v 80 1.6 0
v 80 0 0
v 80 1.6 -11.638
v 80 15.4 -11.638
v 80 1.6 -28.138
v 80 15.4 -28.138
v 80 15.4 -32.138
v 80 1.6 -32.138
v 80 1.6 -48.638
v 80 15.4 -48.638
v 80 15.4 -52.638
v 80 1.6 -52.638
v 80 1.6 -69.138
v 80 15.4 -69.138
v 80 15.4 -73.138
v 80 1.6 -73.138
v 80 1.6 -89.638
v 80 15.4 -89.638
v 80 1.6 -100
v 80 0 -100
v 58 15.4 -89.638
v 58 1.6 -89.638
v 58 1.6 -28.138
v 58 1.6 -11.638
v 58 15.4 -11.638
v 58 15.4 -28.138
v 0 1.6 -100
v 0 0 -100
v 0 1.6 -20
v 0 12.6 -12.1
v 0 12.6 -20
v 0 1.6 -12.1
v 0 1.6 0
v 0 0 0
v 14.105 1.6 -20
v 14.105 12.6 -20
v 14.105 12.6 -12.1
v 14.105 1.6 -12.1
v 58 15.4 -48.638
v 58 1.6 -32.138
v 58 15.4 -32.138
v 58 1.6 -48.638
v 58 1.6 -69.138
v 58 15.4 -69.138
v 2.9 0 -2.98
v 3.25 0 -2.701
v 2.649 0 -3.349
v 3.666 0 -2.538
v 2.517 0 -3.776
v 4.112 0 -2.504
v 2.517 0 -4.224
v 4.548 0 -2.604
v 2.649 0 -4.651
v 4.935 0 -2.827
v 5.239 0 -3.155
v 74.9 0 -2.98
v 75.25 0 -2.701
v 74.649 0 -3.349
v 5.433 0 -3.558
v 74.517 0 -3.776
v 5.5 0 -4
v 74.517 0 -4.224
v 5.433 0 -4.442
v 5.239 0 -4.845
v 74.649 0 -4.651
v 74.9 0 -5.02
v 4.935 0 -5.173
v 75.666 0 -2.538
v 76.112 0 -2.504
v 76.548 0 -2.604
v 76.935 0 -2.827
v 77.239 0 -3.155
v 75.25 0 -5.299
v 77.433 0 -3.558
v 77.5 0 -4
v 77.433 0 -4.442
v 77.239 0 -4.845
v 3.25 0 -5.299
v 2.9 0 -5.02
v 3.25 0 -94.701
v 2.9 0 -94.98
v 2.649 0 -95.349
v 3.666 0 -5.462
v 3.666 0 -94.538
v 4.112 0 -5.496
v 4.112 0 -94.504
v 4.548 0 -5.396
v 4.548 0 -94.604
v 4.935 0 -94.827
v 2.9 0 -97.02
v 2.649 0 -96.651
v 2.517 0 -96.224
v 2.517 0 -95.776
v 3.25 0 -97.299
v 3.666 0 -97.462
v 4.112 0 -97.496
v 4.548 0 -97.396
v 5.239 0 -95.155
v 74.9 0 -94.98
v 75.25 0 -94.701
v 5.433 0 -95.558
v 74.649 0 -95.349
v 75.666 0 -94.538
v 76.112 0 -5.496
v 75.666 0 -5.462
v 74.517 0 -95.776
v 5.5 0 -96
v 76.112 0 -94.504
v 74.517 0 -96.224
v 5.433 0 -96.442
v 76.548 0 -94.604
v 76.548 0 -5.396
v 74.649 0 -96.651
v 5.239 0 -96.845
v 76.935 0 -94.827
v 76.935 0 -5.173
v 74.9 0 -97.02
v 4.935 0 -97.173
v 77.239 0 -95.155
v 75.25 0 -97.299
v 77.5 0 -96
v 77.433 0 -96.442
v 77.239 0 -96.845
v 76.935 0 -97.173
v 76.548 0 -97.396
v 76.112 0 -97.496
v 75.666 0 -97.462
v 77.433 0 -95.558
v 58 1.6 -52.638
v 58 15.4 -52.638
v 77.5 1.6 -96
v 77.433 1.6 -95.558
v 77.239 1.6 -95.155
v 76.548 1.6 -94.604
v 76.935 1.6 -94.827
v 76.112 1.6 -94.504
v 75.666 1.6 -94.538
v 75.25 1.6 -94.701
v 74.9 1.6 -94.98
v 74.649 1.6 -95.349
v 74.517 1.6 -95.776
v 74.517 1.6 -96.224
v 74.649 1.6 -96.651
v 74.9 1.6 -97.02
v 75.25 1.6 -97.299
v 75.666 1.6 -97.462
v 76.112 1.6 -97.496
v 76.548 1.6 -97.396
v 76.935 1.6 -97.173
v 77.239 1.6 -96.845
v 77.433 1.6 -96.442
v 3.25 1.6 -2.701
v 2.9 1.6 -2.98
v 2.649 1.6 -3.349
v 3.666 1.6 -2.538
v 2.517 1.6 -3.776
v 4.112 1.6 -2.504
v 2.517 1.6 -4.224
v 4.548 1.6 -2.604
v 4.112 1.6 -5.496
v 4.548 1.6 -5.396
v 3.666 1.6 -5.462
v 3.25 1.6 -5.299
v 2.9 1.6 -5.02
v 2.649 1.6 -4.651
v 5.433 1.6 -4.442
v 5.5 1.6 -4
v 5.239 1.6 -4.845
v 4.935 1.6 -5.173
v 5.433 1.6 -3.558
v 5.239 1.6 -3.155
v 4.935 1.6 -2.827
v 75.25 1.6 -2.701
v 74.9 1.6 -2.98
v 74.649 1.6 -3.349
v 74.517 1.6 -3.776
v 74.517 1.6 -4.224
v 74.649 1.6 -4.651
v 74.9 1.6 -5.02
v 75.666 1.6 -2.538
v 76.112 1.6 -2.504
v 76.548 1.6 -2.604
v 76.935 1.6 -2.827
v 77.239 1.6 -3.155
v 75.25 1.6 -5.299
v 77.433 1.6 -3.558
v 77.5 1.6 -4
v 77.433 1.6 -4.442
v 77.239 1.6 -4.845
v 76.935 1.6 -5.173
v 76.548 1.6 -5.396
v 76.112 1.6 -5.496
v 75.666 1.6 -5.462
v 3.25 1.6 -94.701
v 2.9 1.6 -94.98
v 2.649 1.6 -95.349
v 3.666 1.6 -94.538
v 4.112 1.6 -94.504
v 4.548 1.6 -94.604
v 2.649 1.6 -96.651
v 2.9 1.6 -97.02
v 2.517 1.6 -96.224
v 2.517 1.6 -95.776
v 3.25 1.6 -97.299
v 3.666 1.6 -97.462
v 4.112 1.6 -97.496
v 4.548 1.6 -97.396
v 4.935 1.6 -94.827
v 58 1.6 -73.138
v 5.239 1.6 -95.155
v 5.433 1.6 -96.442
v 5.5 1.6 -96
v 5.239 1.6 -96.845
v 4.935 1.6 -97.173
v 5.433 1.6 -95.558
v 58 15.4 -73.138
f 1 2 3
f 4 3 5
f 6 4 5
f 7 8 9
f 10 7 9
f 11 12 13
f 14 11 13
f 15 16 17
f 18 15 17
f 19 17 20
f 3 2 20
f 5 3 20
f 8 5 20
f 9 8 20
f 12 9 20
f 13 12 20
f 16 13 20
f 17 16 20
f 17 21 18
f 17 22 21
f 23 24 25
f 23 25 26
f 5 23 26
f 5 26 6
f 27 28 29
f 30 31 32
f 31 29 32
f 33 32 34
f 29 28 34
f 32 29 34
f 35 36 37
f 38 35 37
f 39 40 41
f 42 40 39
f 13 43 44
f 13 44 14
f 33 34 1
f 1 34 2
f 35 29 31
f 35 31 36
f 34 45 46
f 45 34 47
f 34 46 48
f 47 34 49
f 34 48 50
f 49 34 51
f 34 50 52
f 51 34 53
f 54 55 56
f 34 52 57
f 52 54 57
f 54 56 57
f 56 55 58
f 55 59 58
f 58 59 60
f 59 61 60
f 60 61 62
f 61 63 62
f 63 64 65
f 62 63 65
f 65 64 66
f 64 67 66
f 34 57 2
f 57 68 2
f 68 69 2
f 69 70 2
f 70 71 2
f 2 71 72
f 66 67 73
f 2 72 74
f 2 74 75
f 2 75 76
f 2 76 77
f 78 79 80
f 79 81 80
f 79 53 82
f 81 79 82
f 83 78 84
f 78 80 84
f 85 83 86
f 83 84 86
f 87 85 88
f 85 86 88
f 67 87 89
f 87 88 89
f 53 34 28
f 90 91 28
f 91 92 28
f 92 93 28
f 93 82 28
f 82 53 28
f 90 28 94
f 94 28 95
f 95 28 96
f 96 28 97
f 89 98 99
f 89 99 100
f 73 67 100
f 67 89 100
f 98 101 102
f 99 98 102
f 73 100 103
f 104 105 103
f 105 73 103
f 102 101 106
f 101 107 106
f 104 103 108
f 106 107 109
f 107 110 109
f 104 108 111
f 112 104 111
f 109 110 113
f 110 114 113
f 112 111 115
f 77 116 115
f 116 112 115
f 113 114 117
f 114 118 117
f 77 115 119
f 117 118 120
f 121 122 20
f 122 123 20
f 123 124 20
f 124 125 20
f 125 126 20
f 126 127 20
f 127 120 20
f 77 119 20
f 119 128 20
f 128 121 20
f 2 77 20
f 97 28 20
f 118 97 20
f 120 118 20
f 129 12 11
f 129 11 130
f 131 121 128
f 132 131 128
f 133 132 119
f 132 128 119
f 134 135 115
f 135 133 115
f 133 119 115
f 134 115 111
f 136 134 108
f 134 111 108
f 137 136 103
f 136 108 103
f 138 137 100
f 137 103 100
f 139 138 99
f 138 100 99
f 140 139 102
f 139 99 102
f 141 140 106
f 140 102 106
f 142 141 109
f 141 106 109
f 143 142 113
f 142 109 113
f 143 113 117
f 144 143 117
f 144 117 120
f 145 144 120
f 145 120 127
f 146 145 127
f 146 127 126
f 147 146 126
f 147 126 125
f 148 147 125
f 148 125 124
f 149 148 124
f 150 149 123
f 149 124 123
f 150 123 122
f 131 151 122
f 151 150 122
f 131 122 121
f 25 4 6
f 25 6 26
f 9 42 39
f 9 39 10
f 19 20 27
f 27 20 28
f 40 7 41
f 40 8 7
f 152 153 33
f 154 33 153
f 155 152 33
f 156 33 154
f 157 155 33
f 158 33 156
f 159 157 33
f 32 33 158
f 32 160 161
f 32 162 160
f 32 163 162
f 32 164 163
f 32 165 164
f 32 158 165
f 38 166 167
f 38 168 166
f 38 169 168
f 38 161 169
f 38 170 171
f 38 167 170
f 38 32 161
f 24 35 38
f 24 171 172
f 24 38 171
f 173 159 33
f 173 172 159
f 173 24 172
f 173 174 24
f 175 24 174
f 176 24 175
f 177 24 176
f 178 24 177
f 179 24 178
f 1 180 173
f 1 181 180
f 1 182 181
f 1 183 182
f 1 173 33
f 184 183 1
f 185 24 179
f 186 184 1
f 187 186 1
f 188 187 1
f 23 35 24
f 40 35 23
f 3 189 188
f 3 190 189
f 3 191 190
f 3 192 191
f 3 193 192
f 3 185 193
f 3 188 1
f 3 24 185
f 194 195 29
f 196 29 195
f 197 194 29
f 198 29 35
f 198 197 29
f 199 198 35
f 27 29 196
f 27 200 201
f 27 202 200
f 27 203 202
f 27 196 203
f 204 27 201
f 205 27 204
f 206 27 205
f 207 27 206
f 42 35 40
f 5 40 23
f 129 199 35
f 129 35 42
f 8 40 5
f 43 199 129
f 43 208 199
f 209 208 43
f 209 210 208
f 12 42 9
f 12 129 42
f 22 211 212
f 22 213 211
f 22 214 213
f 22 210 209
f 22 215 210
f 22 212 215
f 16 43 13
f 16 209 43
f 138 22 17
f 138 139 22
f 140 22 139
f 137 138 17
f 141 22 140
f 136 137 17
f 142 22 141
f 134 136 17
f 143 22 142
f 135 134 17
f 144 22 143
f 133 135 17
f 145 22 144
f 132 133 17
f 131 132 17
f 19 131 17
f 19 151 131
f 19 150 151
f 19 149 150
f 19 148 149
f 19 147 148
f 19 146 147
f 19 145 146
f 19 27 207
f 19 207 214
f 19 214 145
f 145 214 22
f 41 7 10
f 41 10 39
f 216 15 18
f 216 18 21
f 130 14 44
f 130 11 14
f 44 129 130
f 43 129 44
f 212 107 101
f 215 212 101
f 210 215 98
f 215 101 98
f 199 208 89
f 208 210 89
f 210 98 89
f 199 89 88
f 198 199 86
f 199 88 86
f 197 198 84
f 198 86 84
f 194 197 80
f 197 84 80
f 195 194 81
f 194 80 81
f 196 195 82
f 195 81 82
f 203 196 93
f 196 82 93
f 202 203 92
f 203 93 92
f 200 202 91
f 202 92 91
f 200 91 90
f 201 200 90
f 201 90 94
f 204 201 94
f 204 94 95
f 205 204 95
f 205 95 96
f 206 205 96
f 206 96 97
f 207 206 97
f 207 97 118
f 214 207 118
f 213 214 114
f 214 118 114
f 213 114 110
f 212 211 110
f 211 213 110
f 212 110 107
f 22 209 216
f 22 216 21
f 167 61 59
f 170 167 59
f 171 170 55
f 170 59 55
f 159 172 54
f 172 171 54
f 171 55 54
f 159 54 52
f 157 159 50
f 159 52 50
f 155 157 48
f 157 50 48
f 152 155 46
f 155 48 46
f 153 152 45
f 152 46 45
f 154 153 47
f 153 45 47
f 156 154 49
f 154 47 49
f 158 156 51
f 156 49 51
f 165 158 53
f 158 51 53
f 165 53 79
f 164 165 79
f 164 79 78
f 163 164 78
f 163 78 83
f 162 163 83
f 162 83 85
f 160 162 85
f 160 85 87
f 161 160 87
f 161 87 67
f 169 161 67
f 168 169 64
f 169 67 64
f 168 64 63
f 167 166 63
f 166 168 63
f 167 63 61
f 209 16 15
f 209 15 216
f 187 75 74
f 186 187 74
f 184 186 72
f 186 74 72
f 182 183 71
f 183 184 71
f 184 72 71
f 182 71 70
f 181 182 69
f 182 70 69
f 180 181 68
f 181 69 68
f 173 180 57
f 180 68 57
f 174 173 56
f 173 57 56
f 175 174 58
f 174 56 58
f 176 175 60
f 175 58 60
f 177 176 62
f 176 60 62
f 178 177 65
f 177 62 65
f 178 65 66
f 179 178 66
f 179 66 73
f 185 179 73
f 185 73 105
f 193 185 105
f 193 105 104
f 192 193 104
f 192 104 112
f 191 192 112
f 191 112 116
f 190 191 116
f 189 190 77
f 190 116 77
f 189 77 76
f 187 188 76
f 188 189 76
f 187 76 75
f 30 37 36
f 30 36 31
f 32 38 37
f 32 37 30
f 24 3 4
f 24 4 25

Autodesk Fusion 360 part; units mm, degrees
sketch "Sketch1" plane through (0, 0, 0) normal (0, 1, 0) x (1, 0, 0)
  line L0 (0, 0) -> (80, 0)
  line L1 (80, 0) -> (80, 100)
  line L2 (80, 100) -> (0, 100)
  line L3 (0, 100) -> (0, 0)
  circle A0 centre (4, 96) radius 1.5
  circle A1 centre (76, 96) radius 1.5
  circle A2 centre (76, 4) radius 1.5
  circle A3 centre (4, 4) radius 1.5
  line L4 (40, 100) -> (40, 0) construction
  line L5 (0, 50) -> (80, 50) construction
  line L6 (4, 96) -> (40, 96) construction
  line L7 (76, 96) -> (76, 50) construction
  line L8 (76, 96) -> (40, 96) construction
  line L9 (76, 50) -> (76, 4) construction
  dimension "d1" = 80
  dimension "d2" = 100
  dimension "d3" = 3
  dimension "d4" = 72
  dimension "d5" = 92
extrude "Extrude1" add sketch "Sketch1" along normal blind 1.6
sketch "Sketch2" plane through (0, 1.6, 0) normal (0, 1, 0) x (-1, 0, 0)
  circle A0 centre (-4, -96) radius 1.5
  circle A1 centre (-4, -4) radius 1.5
  circle A2 centre (-76, -96) radius 1.5
  circle A3 centre (-76, -4) radius 1.5
  line L0 (0, -100) -> (0, 0)
  line L1 (0, 0) -> (-80, 0)
  line L2 (-80, 0) -> (-80, -100)
  line L3 (-80, -100) -> (0, -100)
  line L4 (-58, -89.6377) -> (-80, -89.6377)
  line L5 (-80, -89.6377) -> (-80, -73.1377)
  line L6 (-80, -73.1377) -> (-58, -73.1377)
  line L7 (-58, -73.1377) -> (-58, -89.6377)
  line L8 (-58, -69.1377) -> (-80, -69.1377)
  line L9 (-80, -69.1377) -> (-80, -52.6377)
  line L10 (-80, -52.6377) -> (-58, -52.6377)
  line L11 (-58, -52.6377) -> (-58, -69.1377)
  line L12 (-58, -48.6377) -> (-80, -48.6377)
  line L13 (-80, -48.6377) -> (-80, -32.1377)
  line L14 (-80, -32.1377) -> (-58, -32.1377)
  line L15 (-58, -32.1377) -> (-58, -48.6377)
  line L16 (-58, -28.1377) -> (-80, -28.1377)
  line L17 (-80, -28.1377) -> (-80, -11.6377)
  line L18 (-80, -11.6377) -> (-58, -11.6377)
  line L19 (-58, -11.6377) -> (-58, -28.1377)
  line L20 (0, -20) -> (-14.1052, -20)
  line L21 (-14.1052, -20) -> (-14.1052, -12.0995)
  line L22 (-14.1052, -12.0995) -> (0, -12.0995)
  line L23 (0, -12.0995) -> (0, -20)
  dimension "d8" = 16.5
  dimension "d9" = 22
  dimension "d10" = 4
  dimension "d11" = 4
  dimension "d12" = 4
extrude "Extrude2" add sketch "Sketch2" along normal blind 13.8 contours L2 L4 L5 L6 L7 | L2 L8 L9 L10 L11 | L2 L16 L17 L18 L19 | L2 L12 L13 L14 L15
extrude "Extrude3" add sketch "Sketch2" along normal blind 11 contours L0 L20 L21 L22 L23
sketch "Sketch3" plane through (0, 1.6, 0) normal (0, 1, 0) x (-1, 0, 0)
